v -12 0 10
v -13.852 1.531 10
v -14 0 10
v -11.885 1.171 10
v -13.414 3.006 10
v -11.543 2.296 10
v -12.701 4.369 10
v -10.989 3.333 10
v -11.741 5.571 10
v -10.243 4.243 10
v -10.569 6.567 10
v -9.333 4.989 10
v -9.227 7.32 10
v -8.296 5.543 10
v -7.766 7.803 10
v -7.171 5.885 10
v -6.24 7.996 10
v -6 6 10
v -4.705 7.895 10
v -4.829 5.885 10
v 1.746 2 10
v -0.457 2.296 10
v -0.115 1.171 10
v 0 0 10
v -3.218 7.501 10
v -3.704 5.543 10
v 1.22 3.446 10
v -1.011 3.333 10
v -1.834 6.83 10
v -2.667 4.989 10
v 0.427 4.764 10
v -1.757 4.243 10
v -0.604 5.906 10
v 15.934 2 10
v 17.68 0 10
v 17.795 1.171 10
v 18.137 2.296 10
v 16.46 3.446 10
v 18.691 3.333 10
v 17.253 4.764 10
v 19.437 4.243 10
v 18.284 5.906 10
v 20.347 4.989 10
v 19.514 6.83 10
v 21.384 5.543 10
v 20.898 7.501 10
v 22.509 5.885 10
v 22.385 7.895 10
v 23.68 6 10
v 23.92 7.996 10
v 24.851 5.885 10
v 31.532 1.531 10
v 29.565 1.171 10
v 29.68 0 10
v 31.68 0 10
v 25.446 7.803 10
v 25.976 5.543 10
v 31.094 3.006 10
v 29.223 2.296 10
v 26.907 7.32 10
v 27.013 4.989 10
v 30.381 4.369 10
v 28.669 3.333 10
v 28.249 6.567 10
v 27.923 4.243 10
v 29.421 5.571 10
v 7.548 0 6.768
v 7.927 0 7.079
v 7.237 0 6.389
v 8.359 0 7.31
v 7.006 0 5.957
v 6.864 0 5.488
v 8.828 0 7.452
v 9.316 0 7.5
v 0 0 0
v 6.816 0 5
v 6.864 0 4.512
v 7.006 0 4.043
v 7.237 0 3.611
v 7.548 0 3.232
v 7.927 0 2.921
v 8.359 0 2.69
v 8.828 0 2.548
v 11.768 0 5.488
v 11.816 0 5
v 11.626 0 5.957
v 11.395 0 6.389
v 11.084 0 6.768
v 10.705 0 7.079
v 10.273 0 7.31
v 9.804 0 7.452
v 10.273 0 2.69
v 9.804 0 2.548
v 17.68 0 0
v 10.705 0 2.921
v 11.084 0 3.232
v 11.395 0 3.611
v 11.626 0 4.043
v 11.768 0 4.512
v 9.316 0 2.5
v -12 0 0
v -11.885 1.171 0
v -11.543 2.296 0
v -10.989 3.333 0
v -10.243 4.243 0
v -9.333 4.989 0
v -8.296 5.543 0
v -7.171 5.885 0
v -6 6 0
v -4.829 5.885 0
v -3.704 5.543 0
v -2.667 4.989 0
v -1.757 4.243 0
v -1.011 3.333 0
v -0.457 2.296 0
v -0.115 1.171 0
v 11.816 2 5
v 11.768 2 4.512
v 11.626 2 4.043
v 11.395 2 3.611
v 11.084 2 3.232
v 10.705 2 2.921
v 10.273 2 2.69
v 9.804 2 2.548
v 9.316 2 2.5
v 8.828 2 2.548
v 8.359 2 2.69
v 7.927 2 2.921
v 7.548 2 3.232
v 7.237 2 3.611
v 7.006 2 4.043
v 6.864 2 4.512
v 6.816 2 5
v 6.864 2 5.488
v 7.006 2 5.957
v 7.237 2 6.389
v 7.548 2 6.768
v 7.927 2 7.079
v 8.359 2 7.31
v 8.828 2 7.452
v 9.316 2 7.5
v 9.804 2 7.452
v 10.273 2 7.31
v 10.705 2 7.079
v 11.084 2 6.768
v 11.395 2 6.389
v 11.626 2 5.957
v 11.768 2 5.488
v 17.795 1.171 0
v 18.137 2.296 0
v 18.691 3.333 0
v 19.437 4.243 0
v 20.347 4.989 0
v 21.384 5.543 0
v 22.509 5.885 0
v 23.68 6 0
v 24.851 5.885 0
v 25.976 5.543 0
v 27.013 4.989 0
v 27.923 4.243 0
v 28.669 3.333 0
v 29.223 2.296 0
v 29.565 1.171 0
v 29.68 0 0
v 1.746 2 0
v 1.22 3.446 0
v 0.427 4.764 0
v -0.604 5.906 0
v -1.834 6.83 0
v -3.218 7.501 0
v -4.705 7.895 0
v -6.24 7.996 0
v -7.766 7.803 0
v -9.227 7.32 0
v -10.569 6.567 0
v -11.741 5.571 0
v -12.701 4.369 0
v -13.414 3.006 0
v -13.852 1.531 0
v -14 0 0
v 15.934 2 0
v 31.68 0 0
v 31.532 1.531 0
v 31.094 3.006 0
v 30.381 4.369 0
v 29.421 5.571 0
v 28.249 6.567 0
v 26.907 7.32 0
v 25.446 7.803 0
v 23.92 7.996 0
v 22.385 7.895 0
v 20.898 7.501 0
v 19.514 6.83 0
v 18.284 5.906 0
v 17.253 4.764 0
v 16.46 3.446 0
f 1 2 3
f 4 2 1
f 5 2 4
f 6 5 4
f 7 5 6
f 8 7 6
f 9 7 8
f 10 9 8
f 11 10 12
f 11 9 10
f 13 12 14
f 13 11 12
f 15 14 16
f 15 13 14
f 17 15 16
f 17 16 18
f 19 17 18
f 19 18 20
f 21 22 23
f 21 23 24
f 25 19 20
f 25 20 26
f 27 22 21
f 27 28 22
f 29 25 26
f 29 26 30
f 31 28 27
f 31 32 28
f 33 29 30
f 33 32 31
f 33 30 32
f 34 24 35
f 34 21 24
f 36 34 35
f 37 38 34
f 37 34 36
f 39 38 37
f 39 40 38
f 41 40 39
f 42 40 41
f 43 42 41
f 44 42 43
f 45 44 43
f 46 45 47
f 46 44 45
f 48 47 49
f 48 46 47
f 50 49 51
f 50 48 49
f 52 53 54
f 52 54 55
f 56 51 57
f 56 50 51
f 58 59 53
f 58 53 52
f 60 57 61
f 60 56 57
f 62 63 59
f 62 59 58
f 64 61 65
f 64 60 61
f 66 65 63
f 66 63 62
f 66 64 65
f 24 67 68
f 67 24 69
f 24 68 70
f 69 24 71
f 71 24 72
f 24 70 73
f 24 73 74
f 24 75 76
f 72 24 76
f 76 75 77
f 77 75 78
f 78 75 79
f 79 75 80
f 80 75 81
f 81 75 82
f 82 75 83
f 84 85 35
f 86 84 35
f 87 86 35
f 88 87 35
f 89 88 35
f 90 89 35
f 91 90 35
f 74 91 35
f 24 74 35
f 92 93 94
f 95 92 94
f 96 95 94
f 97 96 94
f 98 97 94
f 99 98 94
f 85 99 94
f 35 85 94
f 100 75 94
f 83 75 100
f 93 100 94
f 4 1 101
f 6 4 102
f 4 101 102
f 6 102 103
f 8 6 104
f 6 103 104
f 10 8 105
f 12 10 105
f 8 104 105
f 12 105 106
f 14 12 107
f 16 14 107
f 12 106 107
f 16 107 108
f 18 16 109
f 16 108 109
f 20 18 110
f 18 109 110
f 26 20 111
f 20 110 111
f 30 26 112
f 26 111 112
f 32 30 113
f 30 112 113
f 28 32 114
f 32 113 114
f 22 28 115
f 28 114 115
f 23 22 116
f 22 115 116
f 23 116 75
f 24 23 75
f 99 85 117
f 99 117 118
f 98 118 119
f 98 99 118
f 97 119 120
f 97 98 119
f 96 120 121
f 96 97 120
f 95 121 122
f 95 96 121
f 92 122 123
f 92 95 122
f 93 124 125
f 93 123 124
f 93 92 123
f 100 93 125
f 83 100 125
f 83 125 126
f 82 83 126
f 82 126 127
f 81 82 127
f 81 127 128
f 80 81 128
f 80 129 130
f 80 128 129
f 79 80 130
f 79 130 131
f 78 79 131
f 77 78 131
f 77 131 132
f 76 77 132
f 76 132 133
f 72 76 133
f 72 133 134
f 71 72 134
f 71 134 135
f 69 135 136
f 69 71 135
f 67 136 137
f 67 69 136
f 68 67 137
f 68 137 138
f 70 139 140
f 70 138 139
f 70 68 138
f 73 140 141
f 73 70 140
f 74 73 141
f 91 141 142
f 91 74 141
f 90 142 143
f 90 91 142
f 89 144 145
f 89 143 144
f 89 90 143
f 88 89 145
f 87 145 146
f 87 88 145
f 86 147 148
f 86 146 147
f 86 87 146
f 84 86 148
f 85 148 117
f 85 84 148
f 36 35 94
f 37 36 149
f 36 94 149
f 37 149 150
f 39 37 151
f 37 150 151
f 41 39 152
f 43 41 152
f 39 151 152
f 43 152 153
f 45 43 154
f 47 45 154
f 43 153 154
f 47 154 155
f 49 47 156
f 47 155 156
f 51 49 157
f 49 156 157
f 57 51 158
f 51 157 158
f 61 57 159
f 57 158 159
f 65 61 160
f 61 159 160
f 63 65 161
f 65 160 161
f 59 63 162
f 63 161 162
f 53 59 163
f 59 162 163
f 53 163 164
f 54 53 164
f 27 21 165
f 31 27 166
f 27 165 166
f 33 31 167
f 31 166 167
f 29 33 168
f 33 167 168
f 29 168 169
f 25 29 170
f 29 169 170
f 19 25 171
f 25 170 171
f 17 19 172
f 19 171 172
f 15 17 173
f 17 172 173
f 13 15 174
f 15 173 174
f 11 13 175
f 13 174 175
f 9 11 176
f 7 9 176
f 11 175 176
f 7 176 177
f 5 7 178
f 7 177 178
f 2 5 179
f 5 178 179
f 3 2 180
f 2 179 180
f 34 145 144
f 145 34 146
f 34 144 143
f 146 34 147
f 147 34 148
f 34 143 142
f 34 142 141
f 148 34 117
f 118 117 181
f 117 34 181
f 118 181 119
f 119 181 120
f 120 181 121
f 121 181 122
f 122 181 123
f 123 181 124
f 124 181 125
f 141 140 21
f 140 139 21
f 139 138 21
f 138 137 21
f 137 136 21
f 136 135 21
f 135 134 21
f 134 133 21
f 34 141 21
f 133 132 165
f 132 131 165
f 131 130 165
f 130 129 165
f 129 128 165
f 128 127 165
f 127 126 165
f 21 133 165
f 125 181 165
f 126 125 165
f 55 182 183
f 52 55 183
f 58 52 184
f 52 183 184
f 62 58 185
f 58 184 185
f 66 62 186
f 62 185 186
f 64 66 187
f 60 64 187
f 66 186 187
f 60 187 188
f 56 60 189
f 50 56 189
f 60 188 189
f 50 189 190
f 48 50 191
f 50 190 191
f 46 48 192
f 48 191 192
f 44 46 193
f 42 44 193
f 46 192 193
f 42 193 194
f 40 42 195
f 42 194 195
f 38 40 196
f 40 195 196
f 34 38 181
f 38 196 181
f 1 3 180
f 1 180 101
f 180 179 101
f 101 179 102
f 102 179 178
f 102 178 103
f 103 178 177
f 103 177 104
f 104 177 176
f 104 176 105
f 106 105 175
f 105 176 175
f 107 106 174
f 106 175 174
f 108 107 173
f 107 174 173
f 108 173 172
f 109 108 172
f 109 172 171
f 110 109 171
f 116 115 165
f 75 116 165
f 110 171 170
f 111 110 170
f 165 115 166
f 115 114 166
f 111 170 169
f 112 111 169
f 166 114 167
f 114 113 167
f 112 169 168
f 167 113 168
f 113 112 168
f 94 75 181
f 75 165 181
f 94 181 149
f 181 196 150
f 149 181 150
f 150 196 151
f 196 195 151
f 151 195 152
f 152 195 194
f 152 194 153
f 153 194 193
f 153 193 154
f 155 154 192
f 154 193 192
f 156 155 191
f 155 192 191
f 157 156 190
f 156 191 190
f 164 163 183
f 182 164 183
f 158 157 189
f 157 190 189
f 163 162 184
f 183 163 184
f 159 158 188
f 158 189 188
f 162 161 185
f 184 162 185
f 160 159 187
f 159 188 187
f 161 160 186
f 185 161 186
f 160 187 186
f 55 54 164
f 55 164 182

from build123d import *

# Parameters (mm, degrees)
Y_KSEKLIK_EKSTR_ZYON1_DEPTH = 10
KES_EKSTR_ZYON1_DEPTH       = 10
KES_EKSTR_ZYON1_DEPTH_BACK  = 5
IZIM2_R                     = 2.5


with BuildPart() as part:
    # Çizim1 → Yükseklik-Ekstrüzyon1 (new body)
    with BuildSketch(Plane.XY):
        with BuildLine():
            Line((0, 0), (17.68, 0))
            ThreePointArc((17.68, 0), (23.68, 6), (29.68, 0))
            Line((29.68, 0), (31.68, 0))
            ThreePointArc((31.68, 0), (24.68803434, 7.93623757), (15.934033308, 2))
            Line((15.934033308, 2), (1.745966692, 2))
            ThreePointArc((1.745966692, 2), (-7.00803434, 7.93623757), (-14, 0))
            Line((-14, 0), (-12, 0))
            ThreePointArc((-12, 0), (-6, 6), (0, 0))
        make_face()
    extrude(amount=Y_KSEKLIK_EKSTR_ZYON1_DEPTH)

    # Çizim2 → Kes-Ekstrüzyon1 (cut, two sides: drawn at the far end of the back side and taken through both)
    with BuildSketch(Plane(origin=(0, 2, 0), x_dir=(1, 0, 0), z_dir=(0, 1, 0)).offset(-KES_EKSTR_ZYON1_DEPTH_BACK)):
        with Locations((9.316, -5)):
            Circle(IZIM2_R)
    extrude(amount=KES_EKSTR_ZYON1_DEPTH + KES_EKSTR_ZYON1_DEPTH_BACK, mode=Mode.SUBTRACT)


solid = part.part
